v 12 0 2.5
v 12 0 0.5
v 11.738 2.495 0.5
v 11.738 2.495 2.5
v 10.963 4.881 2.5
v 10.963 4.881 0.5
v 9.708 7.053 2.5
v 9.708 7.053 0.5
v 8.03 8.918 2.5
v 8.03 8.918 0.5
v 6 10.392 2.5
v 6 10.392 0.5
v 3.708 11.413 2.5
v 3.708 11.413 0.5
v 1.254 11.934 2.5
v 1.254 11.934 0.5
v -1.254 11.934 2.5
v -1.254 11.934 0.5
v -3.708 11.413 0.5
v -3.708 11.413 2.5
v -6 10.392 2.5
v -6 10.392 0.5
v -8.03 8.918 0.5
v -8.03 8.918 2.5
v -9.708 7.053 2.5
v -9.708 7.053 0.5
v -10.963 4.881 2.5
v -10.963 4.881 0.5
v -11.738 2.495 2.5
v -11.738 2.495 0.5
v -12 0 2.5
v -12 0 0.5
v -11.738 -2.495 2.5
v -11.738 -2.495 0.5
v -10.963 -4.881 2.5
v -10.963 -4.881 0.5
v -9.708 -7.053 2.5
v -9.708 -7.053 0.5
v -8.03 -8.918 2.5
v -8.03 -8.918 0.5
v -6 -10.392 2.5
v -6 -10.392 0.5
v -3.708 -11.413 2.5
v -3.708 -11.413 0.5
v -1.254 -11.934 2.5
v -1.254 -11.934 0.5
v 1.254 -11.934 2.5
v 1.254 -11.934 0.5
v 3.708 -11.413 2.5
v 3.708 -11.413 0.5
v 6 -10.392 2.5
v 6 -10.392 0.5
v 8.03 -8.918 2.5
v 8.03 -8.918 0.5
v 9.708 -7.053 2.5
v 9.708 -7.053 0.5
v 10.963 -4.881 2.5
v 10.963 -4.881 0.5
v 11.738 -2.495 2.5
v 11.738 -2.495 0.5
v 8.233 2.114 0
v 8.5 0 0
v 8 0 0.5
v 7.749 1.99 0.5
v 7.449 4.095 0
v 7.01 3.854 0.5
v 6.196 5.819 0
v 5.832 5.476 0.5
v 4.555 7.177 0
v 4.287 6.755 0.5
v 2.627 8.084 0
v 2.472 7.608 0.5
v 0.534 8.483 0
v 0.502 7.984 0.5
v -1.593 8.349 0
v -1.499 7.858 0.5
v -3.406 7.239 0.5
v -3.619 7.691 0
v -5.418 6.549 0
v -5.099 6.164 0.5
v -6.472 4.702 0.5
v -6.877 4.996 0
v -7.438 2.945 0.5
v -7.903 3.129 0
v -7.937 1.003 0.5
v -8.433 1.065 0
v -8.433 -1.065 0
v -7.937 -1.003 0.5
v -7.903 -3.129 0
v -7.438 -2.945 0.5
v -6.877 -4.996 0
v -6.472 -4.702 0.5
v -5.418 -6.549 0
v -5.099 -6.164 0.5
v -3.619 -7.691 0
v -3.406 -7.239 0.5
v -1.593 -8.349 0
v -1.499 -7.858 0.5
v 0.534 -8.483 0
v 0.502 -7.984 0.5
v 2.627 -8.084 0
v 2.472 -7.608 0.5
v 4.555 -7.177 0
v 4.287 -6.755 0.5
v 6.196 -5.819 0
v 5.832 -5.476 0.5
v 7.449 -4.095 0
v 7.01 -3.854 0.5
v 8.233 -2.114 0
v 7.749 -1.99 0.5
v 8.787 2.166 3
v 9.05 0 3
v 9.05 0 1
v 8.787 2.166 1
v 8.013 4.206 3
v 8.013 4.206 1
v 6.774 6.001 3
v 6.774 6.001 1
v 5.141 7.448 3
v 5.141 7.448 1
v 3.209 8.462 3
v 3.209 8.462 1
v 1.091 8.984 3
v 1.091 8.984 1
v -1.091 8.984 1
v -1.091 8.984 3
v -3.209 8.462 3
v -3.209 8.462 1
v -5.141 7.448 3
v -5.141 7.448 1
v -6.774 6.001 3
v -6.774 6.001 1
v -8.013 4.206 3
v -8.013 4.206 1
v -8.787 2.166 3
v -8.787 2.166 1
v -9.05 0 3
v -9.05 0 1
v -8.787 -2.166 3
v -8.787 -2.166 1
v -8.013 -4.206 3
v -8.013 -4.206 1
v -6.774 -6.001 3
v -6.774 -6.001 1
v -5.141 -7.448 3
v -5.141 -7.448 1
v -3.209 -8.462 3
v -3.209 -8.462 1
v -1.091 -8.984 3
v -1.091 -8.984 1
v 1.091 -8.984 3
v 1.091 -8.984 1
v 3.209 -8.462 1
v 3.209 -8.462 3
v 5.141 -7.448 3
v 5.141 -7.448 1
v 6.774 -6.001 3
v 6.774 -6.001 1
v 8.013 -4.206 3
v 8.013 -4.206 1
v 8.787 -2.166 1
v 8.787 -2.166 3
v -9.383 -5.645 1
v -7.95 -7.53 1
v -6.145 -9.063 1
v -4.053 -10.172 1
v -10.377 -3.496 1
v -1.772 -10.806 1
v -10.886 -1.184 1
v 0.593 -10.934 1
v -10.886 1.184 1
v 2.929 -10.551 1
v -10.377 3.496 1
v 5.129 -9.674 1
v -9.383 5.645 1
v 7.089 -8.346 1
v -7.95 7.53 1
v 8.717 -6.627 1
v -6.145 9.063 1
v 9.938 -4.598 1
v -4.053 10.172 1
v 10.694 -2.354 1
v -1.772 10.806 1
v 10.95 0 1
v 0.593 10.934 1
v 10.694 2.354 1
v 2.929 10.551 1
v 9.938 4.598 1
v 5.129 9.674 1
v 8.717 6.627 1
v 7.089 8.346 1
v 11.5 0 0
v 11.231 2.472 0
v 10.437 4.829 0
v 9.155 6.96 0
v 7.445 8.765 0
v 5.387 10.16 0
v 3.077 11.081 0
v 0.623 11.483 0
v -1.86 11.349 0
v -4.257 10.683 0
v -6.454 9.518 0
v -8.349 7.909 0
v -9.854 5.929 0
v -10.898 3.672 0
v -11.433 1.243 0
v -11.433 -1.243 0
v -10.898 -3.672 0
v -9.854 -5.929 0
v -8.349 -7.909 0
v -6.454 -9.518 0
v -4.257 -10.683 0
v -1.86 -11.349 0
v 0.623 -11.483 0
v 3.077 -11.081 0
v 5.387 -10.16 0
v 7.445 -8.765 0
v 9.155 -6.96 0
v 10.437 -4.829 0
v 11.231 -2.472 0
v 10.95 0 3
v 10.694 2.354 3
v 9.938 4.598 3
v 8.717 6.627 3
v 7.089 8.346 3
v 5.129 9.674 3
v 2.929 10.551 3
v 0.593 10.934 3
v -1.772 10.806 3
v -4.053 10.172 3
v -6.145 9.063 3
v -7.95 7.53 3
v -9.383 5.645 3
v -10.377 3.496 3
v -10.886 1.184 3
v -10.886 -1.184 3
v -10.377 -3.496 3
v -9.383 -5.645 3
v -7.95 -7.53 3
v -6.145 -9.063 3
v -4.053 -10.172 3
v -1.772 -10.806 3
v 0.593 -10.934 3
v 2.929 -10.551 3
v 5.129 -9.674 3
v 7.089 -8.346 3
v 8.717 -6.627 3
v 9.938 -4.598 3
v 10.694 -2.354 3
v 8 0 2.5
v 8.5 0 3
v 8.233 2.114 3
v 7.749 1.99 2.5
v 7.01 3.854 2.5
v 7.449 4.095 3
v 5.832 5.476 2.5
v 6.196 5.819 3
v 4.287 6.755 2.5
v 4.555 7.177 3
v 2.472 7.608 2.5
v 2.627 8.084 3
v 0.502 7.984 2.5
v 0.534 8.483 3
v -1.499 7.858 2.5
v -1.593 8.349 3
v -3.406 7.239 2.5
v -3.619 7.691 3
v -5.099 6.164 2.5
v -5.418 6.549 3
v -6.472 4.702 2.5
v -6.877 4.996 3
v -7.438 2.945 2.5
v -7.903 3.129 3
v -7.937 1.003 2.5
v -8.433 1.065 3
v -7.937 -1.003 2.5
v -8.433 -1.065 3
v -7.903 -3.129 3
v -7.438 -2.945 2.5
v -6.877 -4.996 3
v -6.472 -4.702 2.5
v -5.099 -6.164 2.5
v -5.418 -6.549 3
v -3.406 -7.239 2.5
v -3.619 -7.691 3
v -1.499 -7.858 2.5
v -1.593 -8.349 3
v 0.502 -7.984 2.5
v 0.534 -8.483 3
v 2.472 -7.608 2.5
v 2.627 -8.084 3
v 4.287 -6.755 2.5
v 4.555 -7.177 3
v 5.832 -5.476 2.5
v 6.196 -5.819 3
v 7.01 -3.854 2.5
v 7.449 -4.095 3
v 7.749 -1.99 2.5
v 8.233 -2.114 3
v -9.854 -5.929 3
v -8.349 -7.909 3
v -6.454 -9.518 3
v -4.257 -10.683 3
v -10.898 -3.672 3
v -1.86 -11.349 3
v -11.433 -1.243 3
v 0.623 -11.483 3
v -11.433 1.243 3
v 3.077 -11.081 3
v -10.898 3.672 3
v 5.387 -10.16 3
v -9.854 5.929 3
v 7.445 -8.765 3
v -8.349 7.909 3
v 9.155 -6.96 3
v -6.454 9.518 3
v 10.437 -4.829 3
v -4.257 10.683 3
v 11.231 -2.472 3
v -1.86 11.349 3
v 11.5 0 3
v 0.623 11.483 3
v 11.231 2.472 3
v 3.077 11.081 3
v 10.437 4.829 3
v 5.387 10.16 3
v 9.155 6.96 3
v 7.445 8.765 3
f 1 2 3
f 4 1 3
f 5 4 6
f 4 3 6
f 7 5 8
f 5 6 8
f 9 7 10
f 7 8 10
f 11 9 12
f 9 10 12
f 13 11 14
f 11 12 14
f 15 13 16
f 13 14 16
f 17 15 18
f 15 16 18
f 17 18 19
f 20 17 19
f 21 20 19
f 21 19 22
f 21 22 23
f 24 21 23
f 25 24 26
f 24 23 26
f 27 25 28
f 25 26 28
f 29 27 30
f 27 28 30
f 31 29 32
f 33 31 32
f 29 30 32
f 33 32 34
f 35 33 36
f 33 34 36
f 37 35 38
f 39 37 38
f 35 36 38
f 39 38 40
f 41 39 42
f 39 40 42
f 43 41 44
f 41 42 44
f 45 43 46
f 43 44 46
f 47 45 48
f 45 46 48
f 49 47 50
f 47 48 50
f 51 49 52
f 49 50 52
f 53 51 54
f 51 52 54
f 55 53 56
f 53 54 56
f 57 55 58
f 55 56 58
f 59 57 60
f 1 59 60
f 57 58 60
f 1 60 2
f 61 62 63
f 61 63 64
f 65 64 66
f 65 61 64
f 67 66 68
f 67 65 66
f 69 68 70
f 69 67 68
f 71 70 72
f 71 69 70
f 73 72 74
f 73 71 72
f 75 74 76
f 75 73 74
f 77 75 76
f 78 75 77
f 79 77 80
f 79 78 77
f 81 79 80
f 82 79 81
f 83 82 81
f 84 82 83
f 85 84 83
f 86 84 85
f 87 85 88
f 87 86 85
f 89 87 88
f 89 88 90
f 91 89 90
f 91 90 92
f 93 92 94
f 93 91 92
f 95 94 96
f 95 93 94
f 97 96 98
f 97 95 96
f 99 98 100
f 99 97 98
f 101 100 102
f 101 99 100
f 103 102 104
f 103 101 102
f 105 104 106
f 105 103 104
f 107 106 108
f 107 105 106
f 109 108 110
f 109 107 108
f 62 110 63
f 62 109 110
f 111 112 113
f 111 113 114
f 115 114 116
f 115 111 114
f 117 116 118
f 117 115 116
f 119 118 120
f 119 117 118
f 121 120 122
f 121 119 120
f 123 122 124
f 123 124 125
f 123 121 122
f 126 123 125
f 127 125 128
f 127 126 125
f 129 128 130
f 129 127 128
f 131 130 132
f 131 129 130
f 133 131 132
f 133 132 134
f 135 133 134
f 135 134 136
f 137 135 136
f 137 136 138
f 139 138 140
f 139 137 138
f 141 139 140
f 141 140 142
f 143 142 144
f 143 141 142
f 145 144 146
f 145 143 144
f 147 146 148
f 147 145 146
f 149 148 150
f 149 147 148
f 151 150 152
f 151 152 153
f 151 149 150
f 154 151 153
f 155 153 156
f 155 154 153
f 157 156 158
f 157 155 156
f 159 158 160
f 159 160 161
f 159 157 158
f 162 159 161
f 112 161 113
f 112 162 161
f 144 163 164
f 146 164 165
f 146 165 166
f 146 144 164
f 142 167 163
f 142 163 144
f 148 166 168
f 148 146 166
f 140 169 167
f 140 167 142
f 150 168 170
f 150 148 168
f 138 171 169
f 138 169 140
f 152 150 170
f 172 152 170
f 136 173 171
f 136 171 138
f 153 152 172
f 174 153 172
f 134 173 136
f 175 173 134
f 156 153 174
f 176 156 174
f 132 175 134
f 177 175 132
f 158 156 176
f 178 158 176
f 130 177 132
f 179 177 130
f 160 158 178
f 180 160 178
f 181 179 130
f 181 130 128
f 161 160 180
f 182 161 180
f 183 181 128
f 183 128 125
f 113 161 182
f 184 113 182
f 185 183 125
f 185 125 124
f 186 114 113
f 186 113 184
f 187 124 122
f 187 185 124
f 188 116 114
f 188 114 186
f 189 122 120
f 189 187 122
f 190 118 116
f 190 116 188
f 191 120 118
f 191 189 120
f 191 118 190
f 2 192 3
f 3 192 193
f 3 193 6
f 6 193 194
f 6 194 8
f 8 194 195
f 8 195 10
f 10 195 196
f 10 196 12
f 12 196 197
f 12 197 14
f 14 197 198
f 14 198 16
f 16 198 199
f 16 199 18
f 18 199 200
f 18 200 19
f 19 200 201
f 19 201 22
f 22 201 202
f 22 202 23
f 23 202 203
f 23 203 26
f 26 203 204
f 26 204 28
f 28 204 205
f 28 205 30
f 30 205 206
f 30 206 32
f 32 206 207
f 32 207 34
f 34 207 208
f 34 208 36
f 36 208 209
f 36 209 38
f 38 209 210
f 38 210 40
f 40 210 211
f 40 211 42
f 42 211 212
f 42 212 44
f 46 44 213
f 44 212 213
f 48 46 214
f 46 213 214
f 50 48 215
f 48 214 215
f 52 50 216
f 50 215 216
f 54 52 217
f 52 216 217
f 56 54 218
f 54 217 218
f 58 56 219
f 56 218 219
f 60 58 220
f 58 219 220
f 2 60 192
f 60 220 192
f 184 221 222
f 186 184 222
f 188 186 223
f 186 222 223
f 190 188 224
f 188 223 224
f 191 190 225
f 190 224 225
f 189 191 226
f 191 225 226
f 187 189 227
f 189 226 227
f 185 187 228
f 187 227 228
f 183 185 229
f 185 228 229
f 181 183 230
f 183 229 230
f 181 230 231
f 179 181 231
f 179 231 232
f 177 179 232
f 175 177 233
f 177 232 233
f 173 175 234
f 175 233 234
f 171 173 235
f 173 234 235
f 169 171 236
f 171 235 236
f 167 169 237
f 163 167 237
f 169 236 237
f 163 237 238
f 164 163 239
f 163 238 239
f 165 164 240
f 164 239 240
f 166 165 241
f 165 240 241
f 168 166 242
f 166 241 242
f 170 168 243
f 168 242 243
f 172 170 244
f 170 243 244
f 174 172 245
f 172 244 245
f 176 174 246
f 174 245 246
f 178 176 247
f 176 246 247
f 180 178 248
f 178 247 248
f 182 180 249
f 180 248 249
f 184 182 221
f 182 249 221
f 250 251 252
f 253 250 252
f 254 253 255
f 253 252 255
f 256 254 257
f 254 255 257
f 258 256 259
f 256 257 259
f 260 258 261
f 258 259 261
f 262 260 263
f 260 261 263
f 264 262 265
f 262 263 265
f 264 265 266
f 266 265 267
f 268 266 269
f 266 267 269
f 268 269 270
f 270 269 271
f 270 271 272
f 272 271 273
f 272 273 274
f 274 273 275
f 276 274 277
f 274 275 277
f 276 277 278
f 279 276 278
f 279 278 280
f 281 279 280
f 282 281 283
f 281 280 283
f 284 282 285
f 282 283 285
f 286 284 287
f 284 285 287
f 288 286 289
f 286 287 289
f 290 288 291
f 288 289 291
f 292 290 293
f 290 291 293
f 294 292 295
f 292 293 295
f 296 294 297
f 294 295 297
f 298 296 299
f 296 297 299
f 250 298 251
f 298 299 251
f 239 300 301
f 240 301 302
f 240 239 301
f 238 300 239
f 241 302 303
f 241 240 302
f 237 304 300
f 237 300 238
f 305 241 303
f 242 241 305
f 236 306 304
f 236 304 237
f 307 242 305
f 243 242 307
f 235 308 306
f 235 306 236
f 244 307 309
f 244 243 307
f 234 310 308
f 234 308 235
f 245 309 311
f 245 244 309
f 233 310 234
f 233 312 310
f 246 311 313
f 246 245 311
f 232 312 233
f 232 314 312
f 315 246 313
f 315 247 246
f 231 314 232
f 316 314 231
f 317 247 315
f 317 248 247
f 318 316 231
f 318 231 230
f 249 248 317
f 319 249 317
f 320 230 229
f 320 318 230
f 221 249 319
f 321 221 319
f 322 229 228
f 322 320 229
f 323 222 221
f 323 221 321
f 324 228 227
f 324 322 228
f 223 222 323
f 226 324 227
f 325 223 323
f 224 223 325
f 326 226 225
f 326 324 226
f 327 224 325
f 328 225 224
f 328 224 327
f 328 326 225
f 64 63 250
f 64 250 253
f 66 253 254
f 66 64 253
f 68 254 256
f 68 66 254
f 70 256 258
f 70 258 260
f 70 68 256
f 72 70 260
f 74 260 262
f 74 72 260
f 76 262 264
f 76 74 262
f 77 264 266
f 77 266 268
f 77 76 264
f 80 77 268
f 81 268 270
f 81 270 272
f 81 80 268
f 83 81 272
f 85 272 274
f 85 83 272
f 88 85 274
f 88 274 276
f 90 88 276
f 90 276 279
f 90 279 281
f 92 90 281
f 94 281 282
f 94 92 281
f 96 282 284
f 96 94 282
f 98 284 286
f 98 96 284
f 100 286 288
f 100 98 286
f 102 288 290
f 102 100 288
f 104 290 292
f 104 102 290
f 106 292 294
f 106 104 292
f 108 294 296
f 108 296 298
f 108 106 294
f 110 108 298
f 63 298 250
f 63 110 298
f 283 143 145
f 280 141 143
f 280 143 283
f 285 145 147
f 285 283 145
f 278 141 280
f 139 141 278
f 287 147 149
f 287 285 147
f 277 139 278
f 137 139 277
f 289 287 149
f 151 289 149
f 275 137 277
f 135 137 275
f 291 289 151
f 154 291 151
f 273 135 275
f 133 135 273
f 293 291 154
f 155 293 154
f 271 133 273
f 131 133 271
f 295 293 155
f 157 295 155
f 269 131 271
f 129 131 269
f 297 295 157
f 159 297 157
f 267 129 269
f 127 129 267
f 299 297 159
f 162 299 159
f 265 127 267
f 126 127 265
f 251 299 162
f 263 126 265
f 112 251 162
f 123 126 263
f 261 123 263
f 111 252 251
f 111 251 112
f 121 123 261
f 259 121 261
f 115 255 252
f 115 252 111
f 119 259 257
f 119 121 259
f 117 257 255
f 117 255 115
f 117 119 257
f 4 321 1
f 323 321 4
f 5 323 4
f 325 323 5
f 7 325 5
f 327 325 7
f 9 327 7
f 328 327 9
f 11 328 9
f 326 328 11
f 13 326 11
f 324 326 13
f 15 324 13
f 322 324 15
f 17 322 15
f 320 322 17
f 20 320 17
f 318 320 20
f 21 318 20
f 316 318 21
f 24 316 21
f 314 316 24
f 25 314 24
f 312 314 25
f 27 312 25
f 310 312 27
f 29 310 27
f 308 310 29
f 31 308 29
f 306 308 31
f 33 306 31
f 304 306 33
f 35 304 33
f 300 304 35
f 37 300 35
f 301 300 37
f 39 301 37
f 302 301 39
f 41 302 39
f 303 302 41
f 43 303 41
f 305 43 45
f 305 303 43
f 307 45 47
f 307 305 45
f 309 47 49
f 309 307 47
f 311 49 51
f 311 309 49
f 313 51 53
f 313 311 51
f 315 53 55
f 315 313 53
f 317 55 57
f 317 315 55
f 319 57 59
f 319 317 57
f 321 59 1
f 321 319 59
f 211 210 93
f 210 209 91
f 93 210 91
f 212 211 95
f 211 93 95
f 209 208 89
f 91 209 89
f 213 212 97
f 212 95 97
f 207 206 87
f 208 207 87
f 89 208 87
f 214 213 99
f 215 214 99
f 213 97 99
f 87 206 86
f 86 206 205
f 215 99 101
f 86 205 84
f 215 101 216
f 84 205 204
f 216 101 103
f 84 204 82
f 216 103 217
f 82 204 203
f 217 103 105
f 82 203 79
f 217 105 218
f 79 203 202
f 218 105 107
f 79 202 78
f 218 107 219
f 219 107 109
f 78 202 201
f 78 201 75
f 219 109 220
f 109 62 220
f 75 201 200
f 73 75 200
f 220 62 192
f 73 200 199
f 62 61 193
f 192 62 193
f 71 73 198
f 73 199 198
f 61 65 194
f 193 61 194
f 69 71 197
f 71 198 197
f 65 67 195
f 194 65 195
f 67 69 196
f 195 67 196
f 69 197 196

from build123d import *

# Parameters (mm, degrees)
SKETCH1_R           = 12
SKETCH1_R_2         = 8
BOSS_EXTRUDE1_DEPTH = 3
CHAMFER1_SIZE       = 0.5
SKETCH2_R           = 10.95
SKETCH2_R_2         = 9.05
CUT_EXTRUDE1_DEPTH  = 2


with BuildPart() as part:
    # Sketch1 → Boss-Extrude1 (new body)
    with BuildSketch(Plane.XY):
        Circle(SKETCH1_R)
        Circle(SKETCH1_R_2, mode=Mode.SUBTRACT)
    extrude(amount=BOSS_EXTRUDE1_DEPTH)

    # Chamfer1
    chamfer1_edges = [part.edges().sort_by_distance(p)[0] for p in [
        (-12, 0, 0),
        (-12, 0, 3),
        (-8, 0, 0),
        (-8, 0, 3),
    ]]
    chamfer(chamfer1_edges, length=CHAMFER1_SIZE)

    # Sketch2 → Cut-Extrude1 (cut)
    with BuildSketch(Plane.XY.offset(3)):
        Circle(SKETCH2_R)
        Circle(SKETCH2_R_2, mode=Mode.SUBTRACT)
    extrude(amount=-CUT_EXTRUDE1_DEPTH, mode=Mode.SUBTRACT)


solid = part.part
